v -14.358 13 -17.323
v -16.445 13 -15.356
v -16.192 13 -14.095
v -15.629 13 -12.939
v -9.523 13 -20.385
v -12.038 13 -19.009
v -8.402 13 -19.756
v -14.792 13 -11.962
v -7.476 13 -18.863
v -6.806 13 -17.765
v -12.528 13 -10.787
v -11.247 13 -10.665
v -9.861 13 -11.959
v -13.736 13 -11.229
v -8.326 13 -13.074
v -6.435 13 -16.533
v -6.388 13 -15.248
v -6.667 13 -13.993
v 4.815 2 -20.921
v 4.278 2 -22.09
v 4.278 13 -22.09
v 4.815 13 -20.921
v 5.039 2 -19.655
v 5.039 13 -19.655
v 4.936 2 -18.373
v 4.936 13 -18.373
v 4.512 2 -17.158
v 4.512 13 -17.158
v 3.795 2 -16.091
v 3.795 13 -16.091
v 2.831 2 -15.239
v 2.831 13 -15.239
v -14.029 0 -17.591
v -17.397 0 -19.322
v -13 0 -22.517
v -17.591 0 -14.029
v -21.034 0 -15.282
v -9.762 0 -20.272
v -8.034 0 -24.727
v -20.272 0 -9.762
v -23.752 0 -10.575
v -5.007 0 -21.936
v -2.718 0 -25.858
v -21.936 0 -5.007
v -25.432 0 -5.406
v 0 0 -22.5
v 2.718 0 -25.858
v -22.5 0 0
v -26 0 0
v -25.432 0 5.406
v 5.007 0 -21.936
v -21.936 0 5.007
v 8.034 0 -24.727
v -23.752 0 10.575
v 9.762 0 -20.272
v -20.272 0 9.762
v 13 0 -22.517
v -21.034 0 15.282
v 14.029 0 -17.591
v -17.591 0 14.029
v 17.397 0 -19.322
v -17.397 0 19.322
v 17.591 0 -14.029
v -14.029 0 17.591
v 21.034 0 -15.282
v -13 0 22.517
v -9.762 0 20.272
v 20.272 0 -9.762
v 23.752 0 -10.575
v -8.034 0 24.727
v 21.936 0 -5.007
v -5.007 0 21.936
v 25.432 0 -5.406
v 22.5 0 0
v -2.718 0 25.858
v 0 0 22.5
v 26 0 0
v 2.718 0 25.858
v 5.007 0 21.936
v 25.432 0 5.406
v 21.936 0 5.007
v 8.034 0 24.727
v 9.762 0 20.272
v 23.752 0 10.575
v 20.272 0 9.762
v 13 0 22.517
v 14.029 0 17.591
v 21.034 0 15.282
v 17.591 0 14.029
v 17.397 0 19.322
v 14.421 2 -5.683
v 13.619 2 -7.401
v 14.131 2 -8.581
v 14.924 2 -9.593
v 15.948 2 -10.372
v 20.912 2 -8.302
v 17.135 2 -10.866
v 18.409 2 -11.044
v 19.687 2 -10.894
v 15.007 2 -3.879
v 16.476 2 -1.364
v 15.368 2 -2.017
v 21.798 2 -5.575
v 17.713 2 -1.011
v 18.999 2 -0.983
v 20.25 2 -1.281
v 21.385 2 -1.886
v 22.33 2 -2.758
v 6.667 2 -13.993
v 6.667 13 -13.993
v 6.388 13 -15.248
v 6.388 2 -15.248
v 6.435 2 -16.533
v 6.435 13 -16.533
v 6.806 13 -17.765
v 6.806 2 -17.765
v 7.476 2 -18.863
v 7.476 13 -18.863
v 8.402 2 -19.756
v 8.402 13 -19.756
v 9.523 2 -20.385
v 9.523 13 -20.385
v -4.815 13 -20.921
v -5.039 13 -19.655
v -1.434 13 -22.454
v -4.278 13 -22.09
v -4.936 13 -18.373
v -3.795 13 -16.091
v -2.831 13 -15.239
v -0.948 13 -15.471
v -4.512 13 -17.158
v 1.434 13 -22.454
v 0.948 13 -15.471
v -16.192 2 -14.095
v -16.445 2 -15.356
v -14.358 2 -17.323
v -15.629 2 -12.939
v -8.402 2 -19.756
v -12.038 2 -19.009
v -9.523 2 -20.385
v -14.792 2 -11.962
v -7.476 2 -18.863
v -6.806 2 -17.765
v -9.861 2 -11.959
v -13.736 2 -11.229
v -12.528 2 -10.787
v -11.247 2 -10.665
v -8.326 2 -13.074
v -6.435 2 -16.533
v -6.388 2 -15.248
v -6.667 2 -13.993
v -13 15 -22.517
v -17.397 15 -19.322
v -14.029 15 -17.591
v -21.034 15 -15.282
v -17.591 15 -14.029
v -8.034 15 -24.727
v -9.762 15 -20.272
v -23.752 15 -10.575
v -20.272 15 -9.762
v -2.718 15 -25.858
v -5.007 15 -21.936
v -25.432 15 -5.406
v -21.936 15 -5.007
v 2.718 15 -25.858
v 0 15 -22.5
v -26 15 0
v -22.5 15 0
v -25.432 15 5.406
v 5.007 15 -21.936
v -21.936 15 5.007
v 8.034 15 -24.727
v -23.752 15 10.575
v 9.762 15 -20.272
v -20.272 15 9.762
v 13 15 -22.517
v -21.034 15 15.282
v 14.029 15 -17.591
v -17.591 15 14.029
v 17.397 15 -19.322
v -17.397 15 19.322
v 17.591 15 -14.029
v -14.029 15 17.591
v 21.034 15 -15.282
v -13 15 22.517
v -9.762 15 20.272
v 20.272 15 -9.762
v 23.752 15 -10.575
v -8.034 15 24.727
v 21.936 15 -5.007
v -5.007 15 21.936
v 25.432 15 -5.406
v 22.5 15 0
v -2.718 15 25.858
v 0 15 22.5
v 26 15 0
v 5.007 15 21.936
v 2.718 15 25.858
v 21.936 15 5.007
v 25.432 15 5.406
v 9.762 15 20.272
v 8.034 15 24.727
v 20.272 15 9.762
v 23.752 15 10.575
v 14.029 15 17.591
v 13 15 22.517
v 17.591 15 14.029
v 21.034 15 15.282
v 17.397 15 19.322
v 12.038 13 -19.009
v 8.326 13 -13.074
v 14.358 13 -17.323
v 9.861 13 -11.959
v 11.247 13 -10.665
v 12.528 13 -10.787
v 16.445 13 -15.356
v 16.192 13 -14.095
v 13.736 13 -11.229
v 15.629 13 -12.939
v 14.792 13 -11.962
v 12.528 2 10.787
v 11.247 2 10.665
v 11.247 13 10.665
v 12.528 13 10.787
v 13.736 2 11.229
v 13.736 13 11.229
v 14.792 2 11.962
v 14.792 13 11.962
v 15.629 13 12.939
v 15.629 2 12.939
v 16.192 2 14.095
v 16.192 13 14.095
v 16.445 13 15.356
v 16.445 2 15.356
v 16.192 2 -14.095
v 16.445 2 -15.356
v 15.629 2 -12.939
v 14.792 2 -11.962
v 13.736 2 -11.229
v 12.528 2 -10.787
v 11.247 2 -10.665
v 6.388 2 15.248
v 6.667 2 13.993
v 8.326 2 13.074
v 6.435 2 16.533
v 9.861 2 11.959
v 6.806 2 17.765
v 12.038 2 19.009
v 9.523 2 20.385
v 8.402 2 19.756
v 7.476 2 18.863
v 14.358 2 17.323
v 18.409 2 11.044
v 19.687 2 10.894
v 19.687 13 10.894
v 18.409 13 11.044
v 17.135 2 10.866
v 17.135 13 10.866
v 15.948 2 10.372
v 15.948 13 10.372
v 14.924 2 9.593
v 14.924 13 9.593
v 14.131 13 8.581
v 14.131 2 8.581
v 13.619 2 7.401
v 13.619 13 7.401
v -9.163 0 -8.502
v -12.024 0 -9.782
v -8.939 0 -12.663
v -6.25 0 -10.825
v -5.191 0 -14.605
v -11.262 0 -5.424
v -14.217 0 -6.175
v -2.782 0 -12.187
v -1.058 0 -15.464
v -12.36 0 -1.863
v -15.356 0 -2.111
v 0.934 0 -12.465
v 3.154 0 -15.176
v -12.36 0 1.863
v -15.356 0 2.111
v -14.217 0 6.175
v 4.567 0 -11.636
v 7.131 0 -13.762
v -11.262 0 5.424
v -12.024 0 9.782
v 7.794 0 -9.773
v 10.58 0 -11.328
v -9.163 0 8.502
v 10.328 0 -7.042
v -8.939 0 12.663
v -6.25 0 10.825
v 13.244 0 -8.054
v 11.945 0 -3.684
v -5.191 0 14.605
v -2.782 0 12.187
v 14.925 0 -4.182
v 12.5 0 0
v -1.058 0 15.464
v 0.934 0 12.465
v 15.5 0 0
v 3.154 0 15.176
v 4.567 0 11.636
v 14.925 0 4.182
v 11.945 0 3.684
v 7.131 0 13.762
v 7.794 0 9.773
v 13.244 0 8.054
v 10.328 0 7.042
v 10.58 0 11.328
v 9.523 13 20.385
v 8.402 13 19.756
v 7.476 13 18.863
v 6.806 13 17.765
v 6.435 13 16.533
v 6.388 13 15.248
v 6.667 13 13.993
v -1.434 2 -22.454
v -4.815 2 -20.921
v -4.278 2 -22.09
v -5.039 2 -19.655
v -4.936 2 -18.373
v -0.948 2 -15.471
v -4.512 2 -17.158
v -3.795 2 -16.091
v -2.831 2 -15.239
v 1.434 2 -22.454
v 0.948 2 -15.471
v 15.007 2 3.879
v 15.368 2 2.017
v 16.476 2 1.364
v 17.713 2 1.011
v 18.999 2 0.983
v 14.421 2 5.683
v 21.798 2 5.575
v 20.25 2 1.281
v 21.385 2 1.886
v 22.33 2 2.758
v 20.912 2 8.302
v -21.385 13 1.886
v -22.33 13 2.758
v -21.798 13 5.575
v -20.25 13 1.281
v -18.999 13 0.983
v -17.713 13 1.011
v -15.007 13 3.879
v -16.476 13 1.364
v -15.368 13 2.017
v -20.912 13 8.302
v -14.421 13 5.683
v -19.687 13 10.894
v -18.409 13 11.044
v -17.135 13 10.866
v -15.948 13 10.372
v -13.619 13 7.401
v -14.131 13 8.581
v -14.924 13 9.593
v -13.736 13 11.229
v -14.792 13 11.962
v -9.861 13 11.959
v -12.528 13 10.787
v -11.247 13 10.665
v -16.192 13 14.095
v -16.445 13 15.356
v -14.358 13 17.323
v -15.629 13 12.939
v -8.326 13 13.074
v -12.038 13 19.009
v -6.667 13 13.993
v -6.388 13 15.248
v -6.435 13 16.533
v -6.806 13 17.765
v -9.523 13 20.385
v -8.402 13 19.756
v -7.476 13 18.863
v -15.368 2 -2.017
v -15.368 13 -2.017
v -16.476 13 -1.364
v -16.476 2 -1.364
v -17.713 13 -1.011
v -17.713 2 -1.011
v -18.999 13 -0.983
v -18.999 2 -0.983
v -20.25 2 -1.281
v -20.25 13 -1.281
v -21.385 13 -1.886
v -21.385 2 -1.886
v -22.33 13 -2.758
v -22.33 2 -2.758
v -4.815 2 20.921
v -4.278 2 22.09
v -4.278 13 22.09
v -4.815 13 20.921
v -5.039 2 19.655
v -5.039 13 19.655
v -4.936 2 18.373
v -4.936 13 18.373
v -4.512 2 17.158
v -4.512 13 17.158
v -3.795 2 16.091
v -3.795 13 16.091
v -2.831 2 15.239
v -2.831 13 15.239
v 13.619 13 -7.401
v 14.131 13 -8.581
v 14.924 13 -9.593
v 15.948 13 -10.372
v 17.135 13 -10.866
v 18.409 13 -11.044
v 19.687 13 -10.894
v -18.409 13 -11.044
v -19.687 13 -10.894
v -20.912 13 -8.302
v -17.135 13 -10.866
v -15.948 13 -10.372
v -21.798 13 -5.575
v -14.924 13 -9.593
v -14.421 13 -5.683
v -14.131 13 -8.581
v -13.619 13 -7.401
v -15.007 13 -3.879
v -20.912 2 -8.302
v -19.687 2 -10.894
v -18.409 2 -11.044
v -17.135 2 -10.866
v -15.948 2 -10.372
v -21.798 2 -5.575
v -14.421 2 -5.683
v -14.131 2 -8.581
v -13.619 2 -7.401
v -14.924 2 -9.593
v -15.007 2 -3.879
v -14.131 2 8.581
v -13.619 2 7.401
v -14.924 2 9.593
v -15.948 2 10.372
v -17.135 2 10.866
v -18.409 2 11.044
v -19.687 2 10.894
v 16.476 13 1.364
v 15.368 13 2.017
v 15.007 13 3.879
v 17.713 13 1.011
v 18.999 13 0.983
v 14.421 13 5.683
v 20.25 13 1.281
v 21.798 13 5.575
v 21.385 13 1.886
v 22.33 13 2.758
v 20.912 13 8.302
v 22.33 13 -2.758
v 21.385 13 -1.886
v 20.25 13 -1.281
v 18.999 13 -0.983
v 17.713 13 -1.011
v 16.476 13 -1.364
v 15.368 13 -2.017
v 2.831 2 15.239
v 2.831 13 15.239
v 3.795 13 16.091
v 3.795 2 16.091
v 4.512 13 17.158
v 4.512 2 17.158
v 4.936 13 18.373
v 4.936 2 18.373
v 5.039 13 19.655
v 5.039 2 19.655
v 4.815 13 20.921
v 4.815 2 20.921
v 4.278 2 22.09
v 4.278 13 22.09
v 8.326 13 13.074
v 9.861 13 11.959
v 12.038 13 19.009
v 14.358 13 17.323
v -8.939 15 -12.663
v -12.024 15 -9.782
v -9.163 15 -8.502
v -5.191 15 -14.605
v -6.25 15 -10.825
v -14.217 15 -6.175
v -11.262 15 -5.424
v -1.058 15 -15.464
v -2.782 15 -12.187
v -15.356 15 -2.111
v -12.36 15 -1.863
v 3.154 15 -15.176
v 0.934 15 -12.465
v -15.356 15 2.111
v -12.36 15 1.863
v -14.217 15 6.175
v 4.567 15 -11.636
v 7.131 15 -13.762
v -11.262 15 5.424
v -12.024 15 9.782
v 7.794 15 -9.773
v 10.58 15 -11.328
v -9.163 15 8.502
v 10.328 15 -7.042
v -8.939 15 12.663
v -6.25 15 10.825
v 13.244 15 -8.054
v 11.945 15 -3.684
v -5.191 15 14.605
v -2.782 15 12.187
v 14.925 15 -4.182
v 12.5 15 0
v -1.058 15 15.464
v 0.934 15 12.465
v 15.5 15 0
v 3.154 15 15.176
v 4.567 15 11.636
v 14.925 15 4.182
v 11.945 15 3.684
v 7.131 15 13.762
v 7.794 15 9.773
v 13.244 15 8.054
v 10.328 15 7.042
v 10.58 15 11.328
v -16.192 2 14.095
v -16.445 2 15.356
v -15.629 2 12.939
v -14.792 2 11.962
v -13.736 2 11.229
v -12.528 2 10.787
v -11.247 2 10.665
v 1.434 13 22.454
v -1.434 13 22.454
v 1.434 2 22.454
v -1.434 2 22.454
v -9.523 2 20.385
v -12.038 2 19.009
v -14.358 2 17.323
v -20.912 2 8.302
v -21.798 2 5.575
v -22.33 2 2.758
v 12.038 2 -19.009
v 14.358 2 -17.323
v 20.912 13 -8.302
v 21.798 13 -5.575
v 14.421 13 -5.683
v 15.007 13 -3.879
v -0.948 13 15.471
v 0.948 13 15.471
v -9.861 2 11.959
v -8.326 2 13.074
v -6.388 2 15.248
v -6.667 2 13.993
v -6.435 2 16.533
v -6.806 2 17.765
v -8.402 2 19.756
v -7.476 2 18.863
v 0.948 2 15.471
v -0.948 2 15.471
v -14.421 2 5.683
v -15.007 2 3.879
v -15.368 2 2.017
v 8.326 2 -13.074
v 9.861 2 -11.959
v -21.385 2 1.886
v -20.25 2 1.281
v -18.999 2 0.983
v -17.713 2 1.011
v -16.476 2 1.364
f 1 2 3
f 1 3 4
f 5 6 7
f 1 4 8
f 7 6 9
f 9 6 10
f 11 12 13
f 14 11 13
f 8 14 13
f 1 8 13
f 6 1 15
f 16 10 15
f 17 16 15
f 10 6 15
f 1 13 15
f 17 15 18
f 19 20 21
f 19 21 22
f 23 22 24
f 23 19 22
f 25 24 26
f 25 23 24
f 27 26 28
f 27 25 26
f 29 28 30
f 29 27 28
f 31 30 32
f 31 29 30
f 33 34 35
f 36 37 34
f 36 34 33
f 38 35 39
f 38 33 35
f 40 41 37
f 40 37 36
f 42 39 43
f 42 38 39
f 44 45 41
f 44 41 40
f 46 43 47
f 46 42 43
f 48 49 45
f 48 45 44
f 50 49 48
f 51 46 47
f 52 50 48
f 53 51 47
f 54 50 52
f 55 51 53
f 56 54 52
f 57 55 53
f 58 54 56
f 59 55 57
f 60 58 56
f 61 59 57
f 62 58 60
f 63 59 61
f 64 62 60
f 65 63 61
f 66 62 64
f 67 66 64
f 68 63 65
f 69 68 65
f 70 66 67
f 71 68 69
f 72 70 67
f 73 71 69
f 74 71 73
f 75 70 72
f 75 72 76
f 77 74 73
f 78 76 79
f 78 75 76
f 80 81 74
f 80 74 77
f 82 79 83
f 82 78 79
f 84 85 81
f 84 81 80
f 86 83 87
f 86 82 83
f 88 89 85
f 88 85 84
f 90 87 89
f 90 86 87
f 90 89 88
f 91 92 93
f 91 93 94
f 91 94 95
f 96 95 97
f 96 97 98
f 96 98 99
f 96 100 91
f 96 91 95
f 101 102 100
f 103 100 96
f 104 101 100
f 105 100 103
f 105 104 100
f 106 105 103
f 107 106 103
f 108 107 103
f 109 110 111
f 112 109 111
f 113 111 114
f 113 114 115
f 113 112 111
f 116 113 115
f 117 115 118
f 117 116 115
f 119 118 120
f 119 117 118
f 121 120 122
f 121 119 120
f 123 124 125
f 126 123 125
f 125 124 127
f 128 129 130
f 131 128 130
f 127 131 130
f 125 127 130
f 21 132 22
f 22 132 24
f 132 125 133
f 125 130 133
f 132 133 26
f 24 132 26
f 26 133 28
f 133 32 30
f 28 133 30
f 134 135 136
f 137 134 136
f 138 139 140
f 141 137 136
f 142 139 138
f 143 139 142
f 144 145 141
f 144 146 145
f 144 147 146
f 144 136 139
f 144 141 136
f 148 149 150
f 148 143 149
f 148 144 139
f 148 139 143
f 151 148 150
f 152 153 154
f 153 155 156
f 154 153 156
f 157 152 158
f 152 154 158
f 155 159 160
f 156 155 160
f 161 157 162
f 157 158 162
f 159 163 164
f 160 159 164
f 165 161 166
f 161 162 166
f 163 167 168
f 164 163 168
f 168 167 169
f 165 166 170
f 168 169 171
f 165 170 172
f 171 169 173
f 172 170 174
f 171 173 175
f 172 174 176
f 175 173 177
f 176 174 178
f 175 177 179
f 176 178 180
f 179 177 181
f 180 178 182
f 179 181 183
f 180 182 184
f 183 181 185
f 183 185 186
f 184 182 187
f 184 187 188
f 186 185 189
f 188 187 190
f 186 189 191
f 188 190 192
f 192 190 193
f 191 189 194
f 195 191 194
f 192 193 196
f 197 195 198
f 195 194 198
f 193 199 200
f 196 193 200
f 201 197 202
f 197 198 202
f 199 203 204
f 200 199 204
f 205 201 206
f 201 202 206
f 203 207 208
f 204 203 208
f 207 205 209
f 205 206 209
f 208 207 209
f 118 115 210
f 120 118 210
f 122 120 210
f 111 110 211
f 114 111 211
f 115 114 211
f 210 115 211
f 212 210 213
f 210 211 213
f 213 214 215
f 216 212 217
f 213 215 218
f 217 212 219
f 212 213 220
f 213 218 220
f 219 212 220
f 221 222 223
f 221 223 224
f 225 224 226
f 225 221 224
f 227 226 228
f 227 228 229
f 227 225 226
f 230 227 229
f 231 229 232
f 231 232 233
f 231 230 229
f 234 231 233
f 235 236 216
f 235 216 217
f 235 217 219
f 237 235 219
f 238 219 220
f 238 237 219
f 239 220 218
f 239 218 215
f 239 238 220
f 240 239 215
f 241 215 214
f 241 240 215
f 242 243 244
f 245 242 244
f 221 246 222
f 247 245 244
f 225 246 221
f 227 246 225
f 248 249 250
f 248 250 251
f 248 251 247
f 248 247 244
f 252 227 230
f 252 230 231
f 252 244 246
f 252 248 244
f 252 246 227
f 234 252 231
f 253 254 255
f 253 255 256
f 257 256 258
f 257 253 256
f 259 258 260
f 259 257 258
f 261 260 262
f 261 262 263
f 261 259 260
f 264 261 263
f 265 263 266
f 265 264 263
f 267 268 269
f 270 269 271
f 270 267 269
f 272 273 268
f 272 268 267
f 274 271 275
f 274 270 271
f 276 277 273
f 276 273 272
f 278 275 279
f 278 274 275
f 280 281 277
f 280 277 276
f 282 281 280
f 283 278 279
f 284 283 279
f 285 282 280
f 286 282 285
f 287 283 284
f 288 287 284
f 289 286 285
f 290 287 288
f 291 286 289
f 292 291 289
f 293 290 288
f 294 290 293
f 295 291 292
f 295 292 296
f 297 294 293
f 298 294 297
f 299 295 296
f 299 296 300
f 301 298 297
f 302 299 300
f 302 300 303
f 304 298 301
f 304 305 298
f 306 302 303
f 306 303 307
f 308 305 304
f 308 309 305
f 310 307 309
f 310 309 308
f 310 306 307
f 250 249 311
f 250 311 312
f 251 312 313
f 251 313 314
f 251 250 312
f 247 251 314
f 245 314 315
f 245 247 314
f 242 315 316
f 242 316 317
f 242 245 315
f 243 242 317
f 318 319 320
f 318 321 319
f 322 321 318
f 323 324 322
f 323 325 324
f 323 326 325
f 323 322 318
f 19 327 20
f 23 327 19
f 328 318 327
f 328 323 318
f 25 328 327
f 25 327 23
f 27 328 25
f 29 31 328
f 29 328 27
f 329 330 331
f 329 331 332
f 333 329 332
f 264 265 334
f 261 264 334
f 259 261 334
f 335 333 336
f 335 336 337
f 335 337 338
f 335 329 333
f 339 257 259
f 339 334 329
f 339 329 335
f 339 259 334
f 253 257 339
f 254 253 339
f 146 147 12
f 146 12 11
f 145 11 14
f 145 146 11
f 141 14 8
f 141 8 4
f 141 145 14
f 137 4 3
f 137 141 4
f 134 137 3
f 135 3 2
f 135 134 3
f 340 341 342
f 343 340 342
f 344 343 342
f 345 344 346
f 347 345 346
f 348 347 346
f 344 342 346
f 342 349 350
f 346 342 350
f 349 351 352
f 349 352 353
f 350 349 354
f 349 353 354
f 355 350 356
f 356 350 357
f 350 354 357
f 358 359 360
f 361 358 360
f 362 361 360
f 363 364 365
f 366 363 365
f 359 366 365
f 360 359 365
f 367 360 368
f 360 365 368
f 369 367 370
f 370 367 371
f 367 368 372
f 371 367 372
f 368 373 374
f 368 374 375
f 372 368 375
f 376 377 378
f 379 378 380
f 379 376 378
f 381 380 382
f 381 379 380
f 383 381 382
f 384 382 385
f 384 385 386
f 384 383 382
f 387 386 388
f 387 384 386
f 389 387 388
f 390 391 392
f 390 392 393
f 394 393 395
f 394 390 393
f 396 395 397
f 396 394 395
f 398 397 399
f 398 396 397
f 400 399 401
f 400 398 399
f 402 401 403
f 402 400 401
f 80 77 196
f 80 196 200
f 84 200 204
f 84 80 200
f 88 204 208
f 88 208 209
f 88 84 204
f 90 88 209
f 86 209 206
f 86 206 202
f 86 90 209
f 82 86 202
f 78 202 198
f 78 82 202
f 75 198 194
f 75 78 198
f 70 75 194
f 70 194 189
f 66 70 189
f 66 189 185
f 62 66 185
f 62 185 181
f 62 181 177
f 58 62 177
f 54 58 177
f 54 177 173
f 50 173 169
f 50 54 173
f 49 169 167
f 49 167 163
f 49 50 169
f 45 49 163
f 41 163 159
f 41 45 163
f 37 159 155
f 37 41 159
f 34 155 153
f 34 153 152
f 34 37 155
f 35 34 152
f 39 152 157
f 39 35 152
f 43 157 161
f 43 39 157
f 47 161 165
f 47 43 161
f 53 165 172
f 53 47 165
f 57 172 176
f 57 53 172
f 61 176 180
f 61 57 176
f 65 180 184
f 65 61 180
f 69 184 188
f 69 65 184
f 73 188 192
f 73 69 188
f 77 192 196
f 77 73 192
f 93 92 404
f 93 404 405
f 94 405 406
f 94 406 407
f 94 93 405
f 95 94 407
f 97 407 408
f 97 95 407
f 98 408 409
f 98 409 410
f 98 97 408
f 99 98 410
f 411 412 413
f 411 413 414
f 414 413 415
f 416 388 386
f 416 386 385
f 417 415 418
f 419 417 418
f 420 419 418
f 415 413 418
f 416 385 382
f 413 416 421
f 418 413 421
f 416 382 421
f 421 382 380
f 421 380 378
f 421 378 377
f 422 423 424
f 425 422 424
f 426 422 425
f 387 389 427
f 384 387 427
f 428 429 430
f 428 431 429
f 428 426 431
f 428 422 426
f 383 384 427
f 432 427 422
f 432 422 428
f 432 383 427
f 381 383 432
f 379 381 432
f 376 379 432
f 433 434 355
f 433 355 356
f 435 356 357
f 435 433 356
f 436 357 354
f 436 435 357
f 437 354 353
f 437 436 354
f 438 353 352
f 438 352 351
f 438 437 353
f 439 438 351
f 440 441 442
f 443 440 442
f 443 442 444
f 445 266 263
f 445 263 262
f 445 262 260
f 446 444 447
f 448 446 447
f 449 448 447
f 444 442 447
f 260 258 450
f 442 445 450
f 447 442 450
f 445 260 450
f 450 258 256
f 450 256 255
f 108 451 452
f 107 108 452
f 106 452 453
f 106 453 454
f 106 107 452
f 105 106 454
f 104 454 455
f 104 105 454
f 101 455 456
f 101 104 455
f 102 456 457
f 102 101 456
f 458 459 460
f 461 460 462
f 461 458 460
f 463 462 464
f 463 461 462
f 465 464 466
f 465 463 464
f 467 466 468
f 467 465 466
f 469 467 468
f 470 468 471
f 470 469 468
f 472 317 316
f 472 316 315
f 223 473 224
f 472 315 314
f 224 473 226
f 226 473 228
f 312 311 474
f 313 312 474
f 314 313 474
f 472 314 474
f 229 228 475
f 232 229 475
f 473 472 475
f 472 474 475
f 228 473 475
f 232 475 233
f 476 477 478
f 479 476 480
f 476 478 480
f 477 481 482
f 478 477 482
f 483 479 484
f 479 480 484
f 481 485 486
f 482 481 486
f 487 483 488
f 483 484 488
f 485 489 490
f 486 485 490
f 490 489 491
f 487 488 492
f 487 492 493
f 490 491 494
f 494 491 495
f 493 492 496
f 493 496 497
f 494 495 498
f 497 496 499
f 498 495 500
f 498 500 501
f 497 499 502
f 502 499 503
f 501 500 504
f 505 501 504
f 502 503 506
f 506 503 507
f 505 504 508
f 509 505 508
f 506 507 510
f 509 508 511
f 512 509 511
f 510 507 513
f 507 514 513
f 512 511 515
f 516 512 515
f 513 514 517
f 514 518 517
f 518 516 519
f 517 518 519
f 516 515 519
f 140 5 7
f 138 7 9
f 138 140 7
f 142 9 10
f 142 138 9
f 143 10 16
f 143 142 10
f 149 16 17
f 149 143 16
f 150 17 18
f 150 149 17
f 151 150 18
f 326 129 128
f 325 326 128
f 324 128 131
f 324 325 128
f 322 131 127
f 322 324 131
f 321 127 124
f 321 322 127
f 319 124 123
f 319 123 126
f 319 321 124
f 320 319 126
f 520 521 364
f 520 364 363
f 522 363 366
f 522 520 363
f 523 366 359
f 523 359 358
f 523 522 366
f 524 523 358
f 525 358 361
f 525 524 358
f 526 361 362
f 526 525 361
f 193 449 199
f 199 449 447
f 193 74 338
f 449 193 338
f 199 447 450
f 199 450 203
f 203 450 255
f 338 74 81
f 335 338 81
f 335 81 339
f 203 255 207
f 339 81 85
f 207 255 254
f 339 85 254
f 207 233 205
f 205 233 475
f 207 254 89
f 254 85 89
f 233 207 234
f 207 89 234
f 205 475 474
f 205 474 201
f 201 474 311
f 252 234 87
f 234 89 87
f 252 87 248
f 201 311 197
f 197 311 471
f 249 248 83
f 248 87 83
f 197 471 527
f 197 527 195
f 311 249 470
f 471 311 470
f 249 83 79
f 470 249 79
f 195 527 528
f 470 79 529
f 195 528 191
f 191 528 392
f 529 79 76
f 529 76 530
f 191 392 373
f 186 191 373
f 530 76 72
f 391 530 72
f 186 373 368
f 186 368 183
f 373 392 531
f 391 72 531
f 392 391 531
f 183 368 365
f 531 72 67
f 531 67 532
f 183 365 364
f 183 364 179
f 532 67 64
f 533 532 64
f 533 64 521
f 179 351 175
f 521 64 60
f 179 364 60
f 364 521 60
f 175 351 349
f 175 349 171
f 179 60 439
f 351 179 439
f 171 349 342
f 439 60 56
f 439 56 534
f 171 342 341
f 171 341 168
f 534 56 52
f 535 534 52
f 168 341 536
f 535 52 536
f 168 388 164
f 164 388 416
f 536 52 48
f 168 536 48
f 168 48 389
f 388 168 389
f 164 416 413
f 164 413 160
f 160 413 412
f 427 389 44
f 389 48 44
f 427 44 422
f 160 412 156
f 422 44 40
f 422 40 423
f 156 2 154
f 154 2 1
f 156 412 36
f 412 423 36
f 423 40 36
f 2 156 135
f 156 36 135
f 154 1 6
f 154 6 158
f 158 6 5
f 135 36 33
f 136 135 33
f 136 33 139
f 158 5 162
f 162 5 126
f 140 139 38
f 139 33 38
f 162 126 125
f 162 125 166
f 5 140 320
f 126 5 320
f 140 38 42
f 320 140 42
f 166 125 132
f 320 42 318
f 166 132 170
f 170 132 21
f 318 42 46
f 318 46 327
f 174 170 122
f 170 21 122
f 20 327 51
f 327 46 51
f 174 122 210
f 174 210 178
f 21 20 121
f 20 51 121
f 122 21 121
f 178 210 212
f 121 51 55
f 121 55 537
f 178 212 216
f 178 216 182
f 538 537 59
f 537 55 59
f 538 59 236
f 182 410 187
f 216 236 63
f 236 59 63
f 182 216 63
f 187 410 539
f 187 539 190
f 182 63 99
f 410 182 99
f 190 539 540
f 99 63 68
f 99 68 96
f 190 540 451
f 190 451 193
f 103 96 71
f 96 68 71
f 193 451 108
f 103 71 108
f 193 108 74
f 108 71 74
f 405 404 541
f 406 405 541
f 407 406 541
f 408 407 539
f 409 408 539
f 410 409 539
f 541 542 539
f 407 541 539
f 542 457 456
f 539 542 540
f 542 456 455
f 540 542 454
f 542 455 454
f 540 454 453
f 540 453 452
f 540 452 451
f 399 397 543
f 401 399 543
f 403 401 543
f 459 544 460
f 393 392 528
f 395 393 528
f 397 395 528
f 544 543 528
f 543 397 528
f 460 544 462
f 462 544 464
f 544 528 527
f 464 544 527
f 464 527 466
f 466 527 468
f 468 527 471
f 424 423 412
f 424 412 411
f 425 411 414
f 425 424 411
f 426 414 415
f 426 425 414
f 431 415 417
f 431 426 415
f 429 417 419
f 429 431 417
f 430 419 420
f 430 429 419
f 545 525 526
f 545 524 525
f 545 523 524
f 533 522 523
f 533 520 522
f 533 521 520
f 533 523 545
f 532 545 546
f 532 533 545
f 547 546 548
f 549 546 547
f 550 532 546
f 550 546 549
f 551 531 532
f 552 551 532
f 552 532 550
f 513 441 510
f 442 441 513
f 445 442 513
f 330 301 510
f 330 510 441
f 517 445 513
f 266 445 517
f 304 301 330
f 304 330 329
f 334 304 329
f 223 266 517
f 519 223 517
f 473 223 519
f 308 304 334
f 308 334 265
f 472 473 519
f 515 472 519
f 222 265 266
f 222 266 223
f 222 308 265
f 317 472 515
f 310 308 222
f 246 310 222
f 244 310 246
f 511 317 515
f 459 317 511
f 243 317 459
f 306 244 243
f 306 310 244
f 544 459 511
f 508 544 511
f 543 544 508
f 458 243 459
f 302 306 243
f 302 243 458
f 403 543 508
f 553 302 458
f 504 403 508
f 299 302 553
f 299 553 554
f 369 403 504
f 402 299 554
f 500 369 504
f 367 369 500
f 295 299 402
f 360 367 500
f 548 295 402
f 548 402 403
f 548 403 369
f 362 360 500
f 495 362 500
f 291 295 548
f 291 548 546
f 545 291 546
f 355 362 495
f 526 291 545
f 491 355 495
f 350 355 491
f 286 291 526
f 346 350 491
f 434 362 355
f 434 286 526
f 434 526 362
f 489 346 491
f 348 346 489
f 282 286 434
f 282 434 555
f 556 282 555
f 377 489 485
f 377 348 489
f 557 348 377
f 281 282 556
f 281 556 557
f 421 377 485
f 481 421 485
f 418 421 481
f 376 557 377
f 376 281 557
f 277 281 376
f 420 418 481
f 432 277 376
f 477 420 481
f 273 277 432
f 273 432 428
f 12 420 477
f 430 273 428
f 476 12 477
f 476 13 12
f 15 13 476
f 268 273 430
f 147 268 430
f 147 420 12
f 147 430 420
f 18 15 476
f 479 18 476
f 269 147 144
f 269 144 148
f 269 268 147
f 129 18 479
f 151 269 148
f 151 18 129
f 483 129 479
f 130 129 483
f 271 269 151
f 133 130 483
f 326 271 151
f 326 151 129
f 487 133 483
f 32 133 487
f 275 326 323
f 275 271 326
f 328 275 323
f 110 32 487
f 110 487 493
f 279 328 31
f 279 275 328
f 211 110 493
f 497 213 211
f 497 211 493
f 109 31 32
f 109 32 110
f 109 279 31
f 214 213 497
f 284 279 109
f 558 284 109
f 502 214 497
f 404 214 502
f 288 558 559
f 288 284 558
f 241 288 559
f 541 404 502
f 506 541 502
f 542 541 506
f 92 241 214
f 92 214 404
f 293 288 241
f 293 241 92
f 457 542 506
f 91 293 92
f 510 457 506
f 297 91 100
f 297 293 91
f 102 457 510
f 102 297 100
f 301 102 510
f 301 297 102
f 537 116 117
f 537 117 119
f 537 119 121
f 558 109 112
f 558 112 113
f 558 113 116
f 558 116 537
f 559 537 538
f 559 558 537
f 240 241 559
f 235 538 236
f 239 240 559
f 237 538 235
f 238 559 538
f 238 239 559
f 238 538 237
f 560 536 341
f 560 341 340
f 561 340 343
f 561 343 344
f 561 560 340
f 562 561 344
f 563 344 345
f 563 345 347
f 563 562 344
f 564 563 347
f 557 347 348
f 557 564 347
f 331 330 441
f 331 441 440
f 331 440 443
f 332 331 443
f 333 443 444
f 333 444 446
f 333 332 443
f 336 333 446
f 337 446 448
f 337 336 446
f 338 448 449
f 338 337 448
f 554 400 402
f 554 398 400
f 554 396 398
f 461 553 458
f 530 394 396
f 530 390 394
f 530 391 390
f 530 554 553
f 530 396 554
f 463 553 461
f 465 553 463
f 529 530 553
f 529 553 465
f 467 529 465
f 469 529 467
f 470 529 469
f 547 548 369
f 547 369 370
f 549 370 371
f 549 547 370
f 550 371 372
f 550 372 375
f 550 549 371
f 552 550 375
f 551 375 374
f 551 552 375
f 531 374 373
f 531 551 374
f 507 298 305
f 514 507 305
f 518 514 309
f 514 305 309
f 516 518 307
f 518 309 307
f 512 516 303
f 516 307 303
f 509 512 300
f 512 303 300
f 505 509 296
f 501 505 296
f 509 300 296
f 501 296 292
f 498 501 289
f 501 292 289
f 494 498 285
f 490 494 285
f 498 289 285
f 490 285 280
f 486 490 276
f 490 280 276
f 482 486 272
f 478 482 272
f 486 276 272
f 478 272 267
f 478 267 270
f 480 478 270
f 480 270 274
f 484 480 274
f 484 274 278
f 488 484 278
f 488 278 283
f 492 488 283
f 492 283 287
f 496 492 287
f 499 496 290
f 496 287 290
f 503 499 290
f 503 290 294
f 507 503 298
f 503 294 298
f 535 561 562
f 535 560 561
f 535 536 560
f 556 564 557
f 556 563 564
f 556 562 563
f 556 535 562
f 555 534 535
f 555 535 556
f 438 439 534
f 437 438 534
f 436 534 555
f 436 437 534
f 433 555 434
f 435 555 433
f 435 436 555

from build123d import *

# Parameters (mm, degrees)
F0_R     = 26
F0_R_2   = 22.5
F1_DEPTH = 15
F3_R     = 5.044876
F4_DEPTH = 11
F0_R_3   = 15.5
F0_R_4   = 12.5
F5_DEPTH = 15


with BuildPart() as f1:
    # F0 (on Front) → F1 (new body)
    with BuildSketch(Plane.XZ):
        Circle(F0_R)
        Circle(F0_R_2, mode=Mode.SUBTRACT)
    extrude(amount=-F1_DEPTH)

    # F3 (on offset) → F4 (join)
    with BuildSketch(Plane.XZ.offset(-2)):
        with Locations((0, -19.415323)):
            Circle(F3_R)
        with Locations((11.41204, -15.707326)):
            Circle(F3_R)
        with Locations((18.465069, -5.999665)):
            Circle(F3_R)
        with Locations((18.465069, 5.999665)):
            Circle(F3_R)
        with Locations((11.41204, 15.707326)):
            Circle(F3_R)
        with Locations((0, 19.415323)):
            Circle(F3_R)
        with Locations((-11.41204, 15.707326)):
            Circle(F3_R)
        with Locations((-18.465069, 5.999665)):
            Circle(F3_R)
        with Locations((-18.465069, -5.999665)):
            Circle(F3_R)
        with Locations((-11.41204, -15.707326)):
            Circle(F3_R)
    extrude(amount=-F4_DEPTH)

    # F0 (on Front) → F5 (join)
    with BuildSketch(Plane.XZ):
        Circle(F0_R_3)
        Circle(F0_R_4, mode=Mode.SUBTRACT)
    extrude(amount=-F5_DEPTH)


solid = f1.part
